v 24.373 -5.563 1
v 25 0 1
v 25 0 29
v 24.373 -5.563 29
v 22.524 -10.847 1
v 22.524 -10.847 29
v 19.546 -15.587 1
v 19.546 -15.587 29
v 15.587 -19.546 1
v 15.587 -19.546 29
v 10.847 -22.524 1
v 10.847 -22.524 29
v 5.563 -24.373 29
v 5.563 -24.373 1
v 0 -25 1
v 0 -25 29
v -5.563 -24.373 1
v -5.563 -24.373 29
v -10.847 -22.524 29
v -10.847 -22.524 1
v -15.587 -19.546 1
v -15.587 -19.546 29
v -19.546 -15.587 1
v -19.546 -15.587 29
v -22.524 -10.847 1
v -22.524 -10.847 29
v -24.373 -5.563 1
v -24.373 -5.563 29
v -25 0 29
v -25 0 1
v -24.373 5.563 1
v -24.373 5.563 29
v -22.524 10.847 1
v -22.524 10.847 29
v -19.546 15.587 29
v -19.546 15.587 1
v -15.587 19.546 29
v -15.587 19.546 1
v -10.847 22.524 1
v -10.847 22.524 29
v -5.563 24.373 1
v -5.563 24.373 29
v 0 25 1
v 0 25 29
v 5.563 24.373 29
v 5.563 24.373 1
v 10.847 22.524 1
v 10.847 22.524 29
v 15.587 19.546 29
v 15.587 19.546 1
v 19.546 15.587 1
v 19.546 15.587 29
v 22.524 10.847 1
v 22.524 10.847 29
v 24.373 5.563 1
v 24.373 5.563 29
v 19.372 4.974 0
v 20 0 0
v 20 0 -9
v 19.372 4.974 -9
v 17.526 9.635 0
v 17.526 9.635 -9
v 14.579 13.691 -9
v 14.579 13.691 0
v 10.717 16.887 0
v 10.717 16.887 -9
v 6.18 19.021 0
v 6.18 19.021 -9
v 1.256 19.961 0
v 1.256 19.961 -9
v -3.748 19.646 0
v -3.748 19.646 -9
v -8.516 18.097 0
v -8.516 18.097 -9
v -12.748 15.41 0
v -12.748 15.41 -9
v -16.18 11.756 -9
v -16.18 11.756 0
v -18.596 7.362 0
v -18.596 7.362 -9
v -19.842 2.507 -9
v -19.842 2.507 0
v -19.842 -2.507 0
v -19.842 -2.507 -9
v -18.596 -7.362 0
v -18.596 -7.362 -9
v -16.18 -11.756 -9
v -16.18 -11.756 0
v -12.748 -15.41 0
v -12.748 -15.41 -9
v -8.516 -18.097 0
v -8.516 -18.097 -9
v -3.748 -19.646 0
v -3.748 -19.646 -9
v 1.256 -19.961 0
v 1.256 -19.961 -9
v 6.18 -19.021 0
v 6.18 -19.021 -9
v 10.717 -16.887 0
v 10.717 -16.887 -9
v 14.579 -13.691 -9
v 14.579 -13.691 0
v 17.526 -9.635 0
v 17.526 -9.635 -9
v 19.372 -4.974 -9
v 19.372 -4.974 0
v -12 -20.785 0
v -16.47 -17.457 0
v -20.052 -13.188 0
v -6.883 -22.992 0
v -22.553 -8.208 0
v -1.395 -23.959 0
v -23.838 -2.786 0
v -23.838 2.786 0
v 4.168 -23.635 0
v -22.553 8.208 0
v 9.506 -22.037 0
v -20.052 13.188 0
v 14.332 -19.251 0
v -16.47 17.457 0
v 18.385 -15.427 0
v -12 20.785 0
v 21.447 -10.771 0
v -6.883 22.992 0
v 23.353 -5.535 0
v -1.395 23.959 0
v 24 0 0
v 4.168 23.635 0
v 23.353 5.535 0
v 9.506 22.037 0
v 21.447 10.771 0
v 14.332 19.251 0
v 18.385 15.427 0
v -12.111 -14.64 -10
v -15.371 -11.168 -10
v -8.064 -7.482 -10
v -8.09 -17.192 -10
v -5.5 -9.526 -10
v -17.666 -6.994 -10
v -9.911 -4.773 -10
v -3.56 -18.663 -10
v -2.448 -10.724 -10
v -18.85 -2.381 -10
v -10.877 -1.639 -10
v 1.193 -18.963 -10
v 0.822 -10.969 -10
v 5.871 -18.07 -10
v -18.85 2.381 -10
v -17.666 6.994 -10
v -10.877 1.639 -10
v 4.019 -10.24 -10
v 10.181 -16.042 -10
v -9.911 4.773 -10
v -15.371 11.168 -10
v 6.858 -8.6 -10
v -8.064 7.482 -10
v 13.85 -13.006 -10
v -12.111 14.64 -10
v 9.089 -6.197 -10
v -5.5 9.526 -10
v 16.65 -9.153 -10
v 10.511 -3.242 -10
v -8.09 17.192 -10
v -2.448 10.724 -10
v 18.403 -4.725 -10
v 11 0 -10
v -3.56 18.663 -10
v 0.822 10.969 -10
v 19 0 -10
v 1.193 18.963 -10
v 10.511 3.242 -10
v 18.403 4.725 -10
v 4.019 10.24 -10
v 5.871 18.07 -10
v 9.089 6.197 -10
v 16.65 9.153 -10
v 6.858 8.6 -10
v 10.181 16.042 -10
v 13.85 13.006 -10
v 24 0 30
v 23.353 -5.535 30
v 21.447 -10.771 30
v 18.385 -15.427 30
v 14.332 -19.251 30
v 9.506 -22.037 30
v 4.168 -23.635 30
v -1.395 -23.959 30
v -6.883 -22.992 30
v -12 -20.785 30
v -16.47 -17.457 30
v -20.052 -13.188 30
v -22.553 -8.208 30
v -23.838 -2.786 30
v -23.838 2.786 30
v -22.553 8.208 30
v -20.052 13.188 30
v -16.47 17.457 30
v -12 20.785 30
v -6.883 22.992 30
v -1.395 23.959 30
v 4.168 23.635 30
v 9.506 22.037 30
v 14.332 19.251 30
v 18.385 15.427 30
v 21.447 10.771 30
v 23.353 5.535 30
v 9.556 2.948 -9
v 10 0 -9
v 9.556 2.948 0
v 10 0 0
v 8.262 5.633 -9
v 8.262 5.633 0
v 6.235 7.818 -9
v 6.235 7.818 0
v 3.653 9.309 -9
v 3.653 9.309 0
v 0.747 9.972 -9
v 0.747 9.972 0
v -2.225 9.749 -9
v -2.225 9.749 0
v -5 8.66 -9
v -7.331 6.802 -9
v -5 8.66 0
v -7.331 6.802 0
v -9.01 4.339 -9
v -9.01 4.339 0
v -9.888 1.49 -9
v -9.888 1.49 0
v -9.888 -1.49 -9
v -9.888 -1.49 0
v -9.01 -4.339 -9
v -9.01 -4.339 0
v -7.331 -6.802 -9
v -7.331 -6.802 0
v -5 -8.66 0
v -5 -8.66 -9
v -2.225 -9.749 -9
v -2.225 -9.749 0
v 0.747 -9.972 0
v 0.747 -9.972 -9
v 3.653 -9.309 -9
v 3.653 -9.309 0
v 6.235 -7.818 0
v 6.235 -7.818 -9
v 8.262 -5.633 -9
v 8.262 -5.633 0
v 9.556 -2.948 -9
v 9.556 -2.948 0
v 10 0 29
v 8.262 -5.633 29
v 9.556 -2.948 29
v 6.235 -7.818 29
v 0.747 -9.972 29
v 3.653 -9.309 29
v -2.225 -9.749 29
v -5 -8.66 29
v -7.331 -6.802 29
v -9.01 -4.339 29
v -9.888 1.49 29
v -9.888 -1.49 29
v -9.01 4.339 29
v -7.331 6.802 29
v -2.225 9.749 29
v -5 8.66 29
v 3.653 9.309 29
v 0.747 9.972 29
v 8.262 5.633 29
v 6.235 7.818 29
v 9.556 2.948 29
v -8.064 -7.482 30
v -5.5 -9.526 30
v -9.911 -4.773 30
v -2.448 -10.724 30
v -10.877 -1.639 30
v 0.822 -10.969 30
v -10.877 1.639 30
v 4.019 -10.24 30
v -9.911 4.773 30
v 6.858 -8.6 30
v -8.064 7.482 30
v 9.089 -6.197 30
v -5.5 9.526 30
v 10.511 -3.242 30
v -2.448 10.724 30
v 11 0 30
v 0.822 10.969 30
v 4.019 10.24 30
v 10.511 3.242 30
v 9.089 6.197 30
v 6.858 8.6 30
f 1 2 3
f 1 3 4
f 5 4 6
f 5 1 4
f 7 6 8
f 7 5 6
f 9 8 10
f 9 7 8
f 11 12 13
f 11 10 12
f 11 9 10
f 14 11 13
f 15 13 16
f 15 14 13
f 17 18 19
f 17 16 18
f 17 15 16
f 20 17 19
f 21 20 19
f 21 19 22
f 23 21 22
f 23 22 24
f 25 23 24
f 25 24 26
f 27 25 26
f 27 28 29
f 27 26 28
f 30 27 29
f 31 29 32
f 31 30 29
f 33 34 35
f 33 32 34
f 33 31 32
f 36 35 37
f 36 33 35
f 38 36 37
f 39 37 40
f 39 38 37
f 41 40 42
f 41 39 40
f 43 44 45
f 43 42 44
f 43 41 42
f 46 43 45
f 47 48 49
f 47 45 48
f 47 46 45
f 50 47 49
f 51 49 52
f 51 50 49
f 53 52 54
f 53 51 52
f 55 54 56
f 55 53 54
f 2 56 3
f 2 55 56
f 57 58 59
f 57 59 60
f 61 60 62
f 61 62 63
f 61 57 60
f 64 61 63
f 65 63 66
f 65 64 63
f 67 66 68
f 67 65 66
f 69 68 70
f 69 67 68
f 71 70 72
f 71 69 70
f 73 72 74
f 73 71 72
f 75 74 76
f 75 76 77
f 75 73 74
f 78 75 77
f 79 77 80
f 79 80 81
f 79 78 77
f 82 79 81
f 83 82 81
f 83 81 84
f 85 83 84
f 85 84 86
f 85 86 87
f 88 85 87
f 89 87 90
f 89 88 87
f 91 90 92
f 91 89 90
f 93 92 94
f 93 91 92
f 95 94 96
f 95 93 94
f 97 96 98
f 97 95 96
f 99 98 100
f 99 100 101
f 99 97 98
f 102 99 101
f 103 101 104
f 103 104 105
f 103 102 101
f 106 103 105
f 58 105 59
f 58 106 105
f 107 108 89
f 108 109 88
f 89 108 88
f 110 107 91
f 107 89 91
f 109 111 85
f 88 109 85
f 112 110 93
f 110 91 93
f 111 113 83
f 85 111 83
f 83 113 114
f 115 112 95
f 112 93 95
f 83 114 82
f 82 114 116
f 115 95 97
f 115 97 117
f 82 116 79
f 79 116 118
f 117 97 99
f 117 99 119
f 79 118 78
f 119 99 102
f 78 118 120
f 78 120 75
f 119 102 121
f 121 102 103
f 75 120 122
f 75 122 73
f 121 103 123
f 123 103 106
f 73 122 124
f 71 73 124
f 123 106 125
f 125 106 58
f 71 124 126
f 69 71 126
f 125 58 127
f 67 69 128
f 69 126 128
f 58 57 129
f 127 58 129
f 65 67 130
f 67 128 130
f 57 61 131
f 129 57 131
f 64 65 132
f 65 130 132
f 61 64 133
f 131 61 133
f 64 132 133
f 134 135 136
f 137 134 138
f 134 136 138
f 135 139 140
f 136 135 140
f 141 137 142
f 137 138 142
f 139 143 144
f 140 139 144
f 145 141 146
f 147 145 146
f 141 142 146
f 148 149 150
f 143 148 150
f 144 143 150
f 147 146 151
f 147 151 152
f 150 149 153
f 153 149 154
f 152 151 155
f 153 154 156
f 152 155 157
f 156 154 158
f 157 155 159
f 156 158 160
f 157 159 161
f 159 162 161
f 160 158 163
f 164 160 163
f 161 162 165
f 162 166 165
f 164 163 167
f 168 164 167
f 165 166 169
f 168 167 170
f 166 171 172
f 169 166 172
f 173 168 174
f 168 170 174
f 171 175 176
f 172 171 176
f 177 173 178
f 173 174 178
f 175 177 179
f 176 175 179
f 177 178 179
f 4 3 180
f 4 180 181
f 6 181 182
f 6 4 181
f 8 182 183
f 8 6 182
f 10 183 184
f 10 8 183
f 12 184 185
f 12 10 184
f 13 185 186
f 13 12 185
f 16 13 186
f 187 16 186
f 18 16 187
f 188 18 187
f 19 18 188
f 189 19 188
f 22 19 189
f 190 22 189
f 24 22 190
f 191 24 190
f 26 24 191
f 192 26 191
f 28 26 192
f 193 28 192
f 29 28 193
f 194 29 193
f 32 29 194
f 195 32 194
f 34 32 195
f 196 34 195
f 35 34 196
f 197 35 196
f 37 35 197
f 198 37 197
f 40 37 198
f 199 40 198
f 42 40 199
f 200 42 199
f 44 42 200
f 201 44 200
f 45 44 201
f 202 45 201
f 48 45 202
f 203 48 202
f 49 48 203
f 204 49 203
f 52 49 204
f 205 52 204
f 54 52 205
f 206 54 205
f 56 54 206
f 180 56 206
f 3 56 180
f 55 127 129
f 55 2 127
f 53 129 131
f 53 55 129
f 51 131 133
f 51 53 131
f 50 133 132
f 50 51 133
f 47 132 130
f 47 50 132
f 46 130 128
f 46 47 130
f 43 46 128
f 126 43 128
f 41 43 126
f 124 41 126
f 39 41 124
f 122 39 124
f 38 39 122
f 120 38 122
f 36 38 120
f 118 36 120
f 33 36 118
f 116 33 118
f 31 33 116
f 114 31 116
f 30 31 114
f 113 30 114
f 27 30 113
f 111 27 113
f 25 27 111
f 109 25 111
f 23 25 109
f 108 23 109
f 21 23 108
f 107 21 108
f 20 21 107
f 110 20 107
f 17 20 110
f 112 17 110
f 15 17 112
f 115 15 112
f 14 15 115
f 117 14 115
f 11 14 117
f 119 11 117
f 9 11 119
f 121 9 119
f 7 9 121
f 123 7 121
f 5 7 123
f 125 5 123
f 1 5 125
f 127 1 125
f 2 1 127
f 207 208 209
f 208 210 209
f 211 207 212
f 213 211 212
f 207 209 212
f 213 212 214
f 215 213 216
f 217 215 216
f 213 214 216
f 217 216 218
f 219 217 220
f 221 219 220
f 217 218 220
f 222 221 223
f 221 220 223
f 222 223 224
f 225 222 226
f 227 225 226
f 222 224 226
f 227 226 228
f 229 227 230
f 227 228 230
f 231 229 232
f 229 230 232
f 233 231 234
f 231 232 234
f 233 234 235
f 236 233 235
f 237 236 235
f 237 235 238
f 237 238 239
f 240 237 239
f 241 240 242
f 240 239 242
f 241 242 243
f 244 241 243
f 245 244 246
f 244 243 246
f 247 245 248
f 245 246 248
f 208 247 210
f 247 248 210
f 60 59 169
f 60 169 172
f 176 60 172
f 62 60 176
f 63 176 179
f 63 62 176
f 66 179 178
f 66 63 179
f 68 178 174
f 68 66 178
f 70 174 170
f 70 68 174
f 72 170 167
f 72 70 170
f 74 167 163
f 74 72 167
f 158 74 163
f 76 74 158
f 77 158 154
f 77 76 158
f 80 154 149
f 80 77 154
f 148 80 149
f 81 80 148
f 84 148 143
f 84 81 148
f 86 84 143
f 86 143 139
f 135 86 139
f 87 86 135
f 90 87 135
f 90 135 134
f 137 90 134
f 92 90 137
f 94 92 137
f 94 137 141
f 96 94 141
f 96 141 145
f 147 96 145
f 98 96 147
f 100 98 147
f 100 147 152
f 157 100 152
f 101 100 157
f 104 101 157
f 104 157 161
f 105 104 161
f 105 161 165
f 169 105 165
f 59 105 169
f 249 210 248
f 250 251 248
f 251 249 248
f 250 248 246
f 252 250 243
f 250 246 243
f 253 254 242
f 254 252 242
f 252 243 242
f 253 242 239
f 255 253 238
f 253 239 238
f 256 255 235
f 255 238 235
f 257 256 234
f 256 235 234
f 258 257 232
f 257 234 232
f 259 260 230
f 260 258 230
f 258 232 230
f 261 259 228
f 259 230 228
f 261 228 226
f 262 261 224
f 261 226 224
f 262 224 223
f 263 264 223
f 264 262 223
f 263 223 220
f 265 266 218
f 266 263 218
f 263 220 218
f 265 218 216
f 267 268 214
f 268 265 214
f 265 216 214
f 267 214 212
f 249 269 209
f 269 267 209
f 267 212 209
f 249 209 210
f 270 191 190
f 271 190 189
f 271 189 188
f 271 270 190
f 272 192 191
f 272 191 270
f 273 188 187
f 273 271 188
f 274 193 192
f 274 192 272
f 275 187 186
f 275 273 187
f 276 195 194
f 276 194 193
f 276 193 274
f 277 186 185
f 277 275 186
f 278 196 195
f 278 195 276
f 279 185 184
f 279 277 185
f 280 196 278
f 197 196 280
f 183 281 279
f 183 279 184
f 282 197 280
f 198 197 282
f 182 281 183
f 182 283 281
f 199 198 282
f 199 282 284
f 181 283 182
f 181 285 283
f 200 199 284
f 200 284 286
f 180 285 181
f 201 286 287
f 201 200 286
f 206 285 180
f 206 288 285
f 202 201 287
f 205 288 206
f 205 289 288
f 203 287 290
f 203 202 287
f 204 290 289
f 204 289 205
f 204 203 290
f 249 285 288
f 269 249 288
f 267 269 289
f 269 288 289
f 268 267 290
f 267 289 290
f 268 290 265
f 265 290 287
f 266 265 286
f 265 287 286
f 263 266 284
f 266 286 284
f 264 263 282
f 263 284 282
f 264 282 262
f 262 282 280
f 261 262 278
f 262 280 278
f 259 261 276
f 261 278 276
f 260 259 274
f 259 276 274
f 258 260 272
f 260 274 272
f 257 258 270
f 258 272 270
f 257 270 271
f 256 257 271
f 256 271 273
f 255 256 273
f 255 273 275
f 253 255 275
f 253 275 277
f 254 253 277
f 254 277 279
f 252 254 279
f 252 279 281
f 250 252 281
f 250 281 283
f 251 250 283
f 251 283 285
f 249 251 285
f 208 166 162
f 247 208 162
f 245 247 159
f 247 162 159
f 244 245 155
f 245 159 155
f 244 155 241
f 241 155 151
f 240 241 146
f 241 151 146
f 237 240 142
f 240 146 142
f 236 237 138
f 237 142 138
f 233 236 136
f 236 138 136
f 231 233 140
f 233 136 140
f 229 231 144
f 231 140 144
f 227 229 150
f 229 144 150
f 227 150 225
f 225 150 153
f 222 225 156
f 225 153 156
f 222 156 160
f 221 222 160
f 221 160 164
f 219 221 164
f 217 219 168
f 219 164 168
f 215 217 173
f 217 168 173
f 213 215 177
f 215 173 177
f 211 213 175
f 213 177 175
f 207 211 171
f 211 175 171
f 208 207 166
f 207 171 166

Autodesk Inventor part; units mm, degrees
ref_plane "YZ Plane" through (0, 0, 0) normal (1, 0, 0) x (0, 1, 0)
ref_plane "XZ Plane" through (0, 0, 0) normal (0, 1, 0) x (-1, 0, 0)
ref_plane "XY Plane" through (0, 0, 0) normal (0, 0, 1) x (1, 0, 0)
sketch "Szkic1" plane through (0, 0, 0) normal (0, 0, 1) x (1, 0, 0)
  circle A0 centre (0, 0) radius 20 projected
  circle A1 centre (0, 0) radius 20
  circle A2 centre (0, 0) radius 10
  point P0 (0, 0)
  dimension "d0" = 20
extrude "Wyciągnięcie proste1" add sketch "Szkic1" against normal blind 10
sketch "Szkic2" plane through (0, 0, 0) normal (0, 0, 1) x (1, 0, 0)
  circle A0 centre (0, 0) radius 20 projected
  circle A1 centre (0, 0) radius 10
  circle A2 centre (0, 0) radius 25
  point P0 (0, 0)
  dimension "d3" = 50
extrude "Wyciągnięcie proste2" add sketch "Szkic2" along normal blind 30 contours A0 | A2
chamfer "Faza1" distance 1 angle 45 5 edges at (-25, 0, 0) (-20, 0, -10) (-10, 0, -10) (-25, 0, 30) (-10, 0, 30)
properties part number "uchwyt1" material "Rury z PCW"
